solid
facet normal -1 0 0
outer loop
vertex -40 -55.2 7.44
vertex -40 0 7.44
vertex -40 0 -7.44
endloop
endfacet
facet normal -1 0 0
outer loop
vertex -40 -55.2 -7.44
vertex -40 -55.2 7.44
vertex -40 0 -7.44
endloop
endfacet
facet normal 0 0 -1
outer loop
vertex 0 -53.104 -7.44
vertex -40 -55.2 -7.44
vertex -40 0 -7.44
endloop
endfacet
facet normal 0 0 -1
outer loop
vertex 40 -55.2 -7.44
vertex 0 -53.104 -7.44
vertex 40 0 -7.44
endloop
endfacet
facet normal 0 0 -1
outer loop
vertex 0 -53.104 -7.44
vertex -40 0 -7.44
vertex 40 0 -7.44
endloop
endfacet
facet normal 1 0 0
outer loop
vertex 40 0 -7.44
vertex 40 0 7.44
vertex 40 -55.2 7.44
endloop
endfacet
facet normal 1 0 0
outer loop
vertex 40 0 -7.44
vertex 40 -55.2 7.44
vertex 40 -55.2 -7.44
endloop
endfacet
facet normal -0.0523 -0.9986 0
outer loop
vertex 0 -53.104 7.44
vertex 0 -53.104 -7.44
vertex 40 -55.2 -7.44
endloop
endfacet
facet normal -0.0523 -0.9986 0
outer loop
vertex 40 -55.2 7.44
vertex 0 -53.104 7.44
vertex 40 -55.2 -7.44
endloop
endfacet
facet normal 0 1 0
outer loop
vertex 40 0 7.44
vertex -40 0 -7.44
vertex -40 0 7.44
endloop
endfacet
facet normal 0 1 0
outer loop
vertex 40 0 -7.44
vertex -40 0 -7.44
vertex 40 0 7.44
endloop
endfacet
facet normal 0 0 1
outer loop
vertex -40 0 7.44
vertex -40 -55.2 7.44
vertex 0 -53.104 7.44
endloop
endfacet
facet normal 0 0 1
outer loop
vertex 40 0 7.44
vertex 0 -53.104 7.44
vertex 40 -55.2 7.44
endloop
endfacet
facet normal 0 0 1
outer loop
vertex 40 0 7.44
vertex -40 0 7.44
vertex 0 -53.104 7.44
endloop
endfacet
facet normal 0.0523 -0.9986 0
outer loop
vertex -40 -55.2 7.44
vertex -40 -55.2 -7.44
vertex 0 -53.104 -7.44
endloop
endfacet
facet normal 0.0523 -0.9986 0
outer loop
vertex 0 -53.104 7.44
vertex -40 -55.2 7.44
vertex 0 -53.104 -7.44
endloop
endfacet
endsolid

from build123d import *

# Parameters (mm, degrees)
SKETCH1_W           = 80
SKETCH1_H           = 14.88
BOSS_EXTRUDE1_DEPTH = 55.2
CUT_EXTRUDE1_DEPTH  = 70.774310459


with BuildPart() as part:
    # Sketch1 → Boss-Extrude1 (new body)
    with BuildSketch(Plane(origin=(0, 0, 0), x_dir=(1, 0, 0), z_dir=(0, 1, 0))):
        Rectangle(SKETCH1_W, SKETCH1_H)
    extrude(amount=-BOSS_EXTRUDE1_DEPTH)

    # Sketch3 → Cut-Extrude1 (cut, through all)
    with BuildSketch(Plane(origin=(0, 0, -7.44), x_dir=(-1, 0, 0), z_dir=(0, 0, -1))):
        Polygon((40, -55.2), (0, -53.103688829), (-40, -55.2), align=None)
    extrude(amount=-CUT_EXTRUDE1_DEPTH, mode=Mode.SUBTRACT)


solid = part.part
